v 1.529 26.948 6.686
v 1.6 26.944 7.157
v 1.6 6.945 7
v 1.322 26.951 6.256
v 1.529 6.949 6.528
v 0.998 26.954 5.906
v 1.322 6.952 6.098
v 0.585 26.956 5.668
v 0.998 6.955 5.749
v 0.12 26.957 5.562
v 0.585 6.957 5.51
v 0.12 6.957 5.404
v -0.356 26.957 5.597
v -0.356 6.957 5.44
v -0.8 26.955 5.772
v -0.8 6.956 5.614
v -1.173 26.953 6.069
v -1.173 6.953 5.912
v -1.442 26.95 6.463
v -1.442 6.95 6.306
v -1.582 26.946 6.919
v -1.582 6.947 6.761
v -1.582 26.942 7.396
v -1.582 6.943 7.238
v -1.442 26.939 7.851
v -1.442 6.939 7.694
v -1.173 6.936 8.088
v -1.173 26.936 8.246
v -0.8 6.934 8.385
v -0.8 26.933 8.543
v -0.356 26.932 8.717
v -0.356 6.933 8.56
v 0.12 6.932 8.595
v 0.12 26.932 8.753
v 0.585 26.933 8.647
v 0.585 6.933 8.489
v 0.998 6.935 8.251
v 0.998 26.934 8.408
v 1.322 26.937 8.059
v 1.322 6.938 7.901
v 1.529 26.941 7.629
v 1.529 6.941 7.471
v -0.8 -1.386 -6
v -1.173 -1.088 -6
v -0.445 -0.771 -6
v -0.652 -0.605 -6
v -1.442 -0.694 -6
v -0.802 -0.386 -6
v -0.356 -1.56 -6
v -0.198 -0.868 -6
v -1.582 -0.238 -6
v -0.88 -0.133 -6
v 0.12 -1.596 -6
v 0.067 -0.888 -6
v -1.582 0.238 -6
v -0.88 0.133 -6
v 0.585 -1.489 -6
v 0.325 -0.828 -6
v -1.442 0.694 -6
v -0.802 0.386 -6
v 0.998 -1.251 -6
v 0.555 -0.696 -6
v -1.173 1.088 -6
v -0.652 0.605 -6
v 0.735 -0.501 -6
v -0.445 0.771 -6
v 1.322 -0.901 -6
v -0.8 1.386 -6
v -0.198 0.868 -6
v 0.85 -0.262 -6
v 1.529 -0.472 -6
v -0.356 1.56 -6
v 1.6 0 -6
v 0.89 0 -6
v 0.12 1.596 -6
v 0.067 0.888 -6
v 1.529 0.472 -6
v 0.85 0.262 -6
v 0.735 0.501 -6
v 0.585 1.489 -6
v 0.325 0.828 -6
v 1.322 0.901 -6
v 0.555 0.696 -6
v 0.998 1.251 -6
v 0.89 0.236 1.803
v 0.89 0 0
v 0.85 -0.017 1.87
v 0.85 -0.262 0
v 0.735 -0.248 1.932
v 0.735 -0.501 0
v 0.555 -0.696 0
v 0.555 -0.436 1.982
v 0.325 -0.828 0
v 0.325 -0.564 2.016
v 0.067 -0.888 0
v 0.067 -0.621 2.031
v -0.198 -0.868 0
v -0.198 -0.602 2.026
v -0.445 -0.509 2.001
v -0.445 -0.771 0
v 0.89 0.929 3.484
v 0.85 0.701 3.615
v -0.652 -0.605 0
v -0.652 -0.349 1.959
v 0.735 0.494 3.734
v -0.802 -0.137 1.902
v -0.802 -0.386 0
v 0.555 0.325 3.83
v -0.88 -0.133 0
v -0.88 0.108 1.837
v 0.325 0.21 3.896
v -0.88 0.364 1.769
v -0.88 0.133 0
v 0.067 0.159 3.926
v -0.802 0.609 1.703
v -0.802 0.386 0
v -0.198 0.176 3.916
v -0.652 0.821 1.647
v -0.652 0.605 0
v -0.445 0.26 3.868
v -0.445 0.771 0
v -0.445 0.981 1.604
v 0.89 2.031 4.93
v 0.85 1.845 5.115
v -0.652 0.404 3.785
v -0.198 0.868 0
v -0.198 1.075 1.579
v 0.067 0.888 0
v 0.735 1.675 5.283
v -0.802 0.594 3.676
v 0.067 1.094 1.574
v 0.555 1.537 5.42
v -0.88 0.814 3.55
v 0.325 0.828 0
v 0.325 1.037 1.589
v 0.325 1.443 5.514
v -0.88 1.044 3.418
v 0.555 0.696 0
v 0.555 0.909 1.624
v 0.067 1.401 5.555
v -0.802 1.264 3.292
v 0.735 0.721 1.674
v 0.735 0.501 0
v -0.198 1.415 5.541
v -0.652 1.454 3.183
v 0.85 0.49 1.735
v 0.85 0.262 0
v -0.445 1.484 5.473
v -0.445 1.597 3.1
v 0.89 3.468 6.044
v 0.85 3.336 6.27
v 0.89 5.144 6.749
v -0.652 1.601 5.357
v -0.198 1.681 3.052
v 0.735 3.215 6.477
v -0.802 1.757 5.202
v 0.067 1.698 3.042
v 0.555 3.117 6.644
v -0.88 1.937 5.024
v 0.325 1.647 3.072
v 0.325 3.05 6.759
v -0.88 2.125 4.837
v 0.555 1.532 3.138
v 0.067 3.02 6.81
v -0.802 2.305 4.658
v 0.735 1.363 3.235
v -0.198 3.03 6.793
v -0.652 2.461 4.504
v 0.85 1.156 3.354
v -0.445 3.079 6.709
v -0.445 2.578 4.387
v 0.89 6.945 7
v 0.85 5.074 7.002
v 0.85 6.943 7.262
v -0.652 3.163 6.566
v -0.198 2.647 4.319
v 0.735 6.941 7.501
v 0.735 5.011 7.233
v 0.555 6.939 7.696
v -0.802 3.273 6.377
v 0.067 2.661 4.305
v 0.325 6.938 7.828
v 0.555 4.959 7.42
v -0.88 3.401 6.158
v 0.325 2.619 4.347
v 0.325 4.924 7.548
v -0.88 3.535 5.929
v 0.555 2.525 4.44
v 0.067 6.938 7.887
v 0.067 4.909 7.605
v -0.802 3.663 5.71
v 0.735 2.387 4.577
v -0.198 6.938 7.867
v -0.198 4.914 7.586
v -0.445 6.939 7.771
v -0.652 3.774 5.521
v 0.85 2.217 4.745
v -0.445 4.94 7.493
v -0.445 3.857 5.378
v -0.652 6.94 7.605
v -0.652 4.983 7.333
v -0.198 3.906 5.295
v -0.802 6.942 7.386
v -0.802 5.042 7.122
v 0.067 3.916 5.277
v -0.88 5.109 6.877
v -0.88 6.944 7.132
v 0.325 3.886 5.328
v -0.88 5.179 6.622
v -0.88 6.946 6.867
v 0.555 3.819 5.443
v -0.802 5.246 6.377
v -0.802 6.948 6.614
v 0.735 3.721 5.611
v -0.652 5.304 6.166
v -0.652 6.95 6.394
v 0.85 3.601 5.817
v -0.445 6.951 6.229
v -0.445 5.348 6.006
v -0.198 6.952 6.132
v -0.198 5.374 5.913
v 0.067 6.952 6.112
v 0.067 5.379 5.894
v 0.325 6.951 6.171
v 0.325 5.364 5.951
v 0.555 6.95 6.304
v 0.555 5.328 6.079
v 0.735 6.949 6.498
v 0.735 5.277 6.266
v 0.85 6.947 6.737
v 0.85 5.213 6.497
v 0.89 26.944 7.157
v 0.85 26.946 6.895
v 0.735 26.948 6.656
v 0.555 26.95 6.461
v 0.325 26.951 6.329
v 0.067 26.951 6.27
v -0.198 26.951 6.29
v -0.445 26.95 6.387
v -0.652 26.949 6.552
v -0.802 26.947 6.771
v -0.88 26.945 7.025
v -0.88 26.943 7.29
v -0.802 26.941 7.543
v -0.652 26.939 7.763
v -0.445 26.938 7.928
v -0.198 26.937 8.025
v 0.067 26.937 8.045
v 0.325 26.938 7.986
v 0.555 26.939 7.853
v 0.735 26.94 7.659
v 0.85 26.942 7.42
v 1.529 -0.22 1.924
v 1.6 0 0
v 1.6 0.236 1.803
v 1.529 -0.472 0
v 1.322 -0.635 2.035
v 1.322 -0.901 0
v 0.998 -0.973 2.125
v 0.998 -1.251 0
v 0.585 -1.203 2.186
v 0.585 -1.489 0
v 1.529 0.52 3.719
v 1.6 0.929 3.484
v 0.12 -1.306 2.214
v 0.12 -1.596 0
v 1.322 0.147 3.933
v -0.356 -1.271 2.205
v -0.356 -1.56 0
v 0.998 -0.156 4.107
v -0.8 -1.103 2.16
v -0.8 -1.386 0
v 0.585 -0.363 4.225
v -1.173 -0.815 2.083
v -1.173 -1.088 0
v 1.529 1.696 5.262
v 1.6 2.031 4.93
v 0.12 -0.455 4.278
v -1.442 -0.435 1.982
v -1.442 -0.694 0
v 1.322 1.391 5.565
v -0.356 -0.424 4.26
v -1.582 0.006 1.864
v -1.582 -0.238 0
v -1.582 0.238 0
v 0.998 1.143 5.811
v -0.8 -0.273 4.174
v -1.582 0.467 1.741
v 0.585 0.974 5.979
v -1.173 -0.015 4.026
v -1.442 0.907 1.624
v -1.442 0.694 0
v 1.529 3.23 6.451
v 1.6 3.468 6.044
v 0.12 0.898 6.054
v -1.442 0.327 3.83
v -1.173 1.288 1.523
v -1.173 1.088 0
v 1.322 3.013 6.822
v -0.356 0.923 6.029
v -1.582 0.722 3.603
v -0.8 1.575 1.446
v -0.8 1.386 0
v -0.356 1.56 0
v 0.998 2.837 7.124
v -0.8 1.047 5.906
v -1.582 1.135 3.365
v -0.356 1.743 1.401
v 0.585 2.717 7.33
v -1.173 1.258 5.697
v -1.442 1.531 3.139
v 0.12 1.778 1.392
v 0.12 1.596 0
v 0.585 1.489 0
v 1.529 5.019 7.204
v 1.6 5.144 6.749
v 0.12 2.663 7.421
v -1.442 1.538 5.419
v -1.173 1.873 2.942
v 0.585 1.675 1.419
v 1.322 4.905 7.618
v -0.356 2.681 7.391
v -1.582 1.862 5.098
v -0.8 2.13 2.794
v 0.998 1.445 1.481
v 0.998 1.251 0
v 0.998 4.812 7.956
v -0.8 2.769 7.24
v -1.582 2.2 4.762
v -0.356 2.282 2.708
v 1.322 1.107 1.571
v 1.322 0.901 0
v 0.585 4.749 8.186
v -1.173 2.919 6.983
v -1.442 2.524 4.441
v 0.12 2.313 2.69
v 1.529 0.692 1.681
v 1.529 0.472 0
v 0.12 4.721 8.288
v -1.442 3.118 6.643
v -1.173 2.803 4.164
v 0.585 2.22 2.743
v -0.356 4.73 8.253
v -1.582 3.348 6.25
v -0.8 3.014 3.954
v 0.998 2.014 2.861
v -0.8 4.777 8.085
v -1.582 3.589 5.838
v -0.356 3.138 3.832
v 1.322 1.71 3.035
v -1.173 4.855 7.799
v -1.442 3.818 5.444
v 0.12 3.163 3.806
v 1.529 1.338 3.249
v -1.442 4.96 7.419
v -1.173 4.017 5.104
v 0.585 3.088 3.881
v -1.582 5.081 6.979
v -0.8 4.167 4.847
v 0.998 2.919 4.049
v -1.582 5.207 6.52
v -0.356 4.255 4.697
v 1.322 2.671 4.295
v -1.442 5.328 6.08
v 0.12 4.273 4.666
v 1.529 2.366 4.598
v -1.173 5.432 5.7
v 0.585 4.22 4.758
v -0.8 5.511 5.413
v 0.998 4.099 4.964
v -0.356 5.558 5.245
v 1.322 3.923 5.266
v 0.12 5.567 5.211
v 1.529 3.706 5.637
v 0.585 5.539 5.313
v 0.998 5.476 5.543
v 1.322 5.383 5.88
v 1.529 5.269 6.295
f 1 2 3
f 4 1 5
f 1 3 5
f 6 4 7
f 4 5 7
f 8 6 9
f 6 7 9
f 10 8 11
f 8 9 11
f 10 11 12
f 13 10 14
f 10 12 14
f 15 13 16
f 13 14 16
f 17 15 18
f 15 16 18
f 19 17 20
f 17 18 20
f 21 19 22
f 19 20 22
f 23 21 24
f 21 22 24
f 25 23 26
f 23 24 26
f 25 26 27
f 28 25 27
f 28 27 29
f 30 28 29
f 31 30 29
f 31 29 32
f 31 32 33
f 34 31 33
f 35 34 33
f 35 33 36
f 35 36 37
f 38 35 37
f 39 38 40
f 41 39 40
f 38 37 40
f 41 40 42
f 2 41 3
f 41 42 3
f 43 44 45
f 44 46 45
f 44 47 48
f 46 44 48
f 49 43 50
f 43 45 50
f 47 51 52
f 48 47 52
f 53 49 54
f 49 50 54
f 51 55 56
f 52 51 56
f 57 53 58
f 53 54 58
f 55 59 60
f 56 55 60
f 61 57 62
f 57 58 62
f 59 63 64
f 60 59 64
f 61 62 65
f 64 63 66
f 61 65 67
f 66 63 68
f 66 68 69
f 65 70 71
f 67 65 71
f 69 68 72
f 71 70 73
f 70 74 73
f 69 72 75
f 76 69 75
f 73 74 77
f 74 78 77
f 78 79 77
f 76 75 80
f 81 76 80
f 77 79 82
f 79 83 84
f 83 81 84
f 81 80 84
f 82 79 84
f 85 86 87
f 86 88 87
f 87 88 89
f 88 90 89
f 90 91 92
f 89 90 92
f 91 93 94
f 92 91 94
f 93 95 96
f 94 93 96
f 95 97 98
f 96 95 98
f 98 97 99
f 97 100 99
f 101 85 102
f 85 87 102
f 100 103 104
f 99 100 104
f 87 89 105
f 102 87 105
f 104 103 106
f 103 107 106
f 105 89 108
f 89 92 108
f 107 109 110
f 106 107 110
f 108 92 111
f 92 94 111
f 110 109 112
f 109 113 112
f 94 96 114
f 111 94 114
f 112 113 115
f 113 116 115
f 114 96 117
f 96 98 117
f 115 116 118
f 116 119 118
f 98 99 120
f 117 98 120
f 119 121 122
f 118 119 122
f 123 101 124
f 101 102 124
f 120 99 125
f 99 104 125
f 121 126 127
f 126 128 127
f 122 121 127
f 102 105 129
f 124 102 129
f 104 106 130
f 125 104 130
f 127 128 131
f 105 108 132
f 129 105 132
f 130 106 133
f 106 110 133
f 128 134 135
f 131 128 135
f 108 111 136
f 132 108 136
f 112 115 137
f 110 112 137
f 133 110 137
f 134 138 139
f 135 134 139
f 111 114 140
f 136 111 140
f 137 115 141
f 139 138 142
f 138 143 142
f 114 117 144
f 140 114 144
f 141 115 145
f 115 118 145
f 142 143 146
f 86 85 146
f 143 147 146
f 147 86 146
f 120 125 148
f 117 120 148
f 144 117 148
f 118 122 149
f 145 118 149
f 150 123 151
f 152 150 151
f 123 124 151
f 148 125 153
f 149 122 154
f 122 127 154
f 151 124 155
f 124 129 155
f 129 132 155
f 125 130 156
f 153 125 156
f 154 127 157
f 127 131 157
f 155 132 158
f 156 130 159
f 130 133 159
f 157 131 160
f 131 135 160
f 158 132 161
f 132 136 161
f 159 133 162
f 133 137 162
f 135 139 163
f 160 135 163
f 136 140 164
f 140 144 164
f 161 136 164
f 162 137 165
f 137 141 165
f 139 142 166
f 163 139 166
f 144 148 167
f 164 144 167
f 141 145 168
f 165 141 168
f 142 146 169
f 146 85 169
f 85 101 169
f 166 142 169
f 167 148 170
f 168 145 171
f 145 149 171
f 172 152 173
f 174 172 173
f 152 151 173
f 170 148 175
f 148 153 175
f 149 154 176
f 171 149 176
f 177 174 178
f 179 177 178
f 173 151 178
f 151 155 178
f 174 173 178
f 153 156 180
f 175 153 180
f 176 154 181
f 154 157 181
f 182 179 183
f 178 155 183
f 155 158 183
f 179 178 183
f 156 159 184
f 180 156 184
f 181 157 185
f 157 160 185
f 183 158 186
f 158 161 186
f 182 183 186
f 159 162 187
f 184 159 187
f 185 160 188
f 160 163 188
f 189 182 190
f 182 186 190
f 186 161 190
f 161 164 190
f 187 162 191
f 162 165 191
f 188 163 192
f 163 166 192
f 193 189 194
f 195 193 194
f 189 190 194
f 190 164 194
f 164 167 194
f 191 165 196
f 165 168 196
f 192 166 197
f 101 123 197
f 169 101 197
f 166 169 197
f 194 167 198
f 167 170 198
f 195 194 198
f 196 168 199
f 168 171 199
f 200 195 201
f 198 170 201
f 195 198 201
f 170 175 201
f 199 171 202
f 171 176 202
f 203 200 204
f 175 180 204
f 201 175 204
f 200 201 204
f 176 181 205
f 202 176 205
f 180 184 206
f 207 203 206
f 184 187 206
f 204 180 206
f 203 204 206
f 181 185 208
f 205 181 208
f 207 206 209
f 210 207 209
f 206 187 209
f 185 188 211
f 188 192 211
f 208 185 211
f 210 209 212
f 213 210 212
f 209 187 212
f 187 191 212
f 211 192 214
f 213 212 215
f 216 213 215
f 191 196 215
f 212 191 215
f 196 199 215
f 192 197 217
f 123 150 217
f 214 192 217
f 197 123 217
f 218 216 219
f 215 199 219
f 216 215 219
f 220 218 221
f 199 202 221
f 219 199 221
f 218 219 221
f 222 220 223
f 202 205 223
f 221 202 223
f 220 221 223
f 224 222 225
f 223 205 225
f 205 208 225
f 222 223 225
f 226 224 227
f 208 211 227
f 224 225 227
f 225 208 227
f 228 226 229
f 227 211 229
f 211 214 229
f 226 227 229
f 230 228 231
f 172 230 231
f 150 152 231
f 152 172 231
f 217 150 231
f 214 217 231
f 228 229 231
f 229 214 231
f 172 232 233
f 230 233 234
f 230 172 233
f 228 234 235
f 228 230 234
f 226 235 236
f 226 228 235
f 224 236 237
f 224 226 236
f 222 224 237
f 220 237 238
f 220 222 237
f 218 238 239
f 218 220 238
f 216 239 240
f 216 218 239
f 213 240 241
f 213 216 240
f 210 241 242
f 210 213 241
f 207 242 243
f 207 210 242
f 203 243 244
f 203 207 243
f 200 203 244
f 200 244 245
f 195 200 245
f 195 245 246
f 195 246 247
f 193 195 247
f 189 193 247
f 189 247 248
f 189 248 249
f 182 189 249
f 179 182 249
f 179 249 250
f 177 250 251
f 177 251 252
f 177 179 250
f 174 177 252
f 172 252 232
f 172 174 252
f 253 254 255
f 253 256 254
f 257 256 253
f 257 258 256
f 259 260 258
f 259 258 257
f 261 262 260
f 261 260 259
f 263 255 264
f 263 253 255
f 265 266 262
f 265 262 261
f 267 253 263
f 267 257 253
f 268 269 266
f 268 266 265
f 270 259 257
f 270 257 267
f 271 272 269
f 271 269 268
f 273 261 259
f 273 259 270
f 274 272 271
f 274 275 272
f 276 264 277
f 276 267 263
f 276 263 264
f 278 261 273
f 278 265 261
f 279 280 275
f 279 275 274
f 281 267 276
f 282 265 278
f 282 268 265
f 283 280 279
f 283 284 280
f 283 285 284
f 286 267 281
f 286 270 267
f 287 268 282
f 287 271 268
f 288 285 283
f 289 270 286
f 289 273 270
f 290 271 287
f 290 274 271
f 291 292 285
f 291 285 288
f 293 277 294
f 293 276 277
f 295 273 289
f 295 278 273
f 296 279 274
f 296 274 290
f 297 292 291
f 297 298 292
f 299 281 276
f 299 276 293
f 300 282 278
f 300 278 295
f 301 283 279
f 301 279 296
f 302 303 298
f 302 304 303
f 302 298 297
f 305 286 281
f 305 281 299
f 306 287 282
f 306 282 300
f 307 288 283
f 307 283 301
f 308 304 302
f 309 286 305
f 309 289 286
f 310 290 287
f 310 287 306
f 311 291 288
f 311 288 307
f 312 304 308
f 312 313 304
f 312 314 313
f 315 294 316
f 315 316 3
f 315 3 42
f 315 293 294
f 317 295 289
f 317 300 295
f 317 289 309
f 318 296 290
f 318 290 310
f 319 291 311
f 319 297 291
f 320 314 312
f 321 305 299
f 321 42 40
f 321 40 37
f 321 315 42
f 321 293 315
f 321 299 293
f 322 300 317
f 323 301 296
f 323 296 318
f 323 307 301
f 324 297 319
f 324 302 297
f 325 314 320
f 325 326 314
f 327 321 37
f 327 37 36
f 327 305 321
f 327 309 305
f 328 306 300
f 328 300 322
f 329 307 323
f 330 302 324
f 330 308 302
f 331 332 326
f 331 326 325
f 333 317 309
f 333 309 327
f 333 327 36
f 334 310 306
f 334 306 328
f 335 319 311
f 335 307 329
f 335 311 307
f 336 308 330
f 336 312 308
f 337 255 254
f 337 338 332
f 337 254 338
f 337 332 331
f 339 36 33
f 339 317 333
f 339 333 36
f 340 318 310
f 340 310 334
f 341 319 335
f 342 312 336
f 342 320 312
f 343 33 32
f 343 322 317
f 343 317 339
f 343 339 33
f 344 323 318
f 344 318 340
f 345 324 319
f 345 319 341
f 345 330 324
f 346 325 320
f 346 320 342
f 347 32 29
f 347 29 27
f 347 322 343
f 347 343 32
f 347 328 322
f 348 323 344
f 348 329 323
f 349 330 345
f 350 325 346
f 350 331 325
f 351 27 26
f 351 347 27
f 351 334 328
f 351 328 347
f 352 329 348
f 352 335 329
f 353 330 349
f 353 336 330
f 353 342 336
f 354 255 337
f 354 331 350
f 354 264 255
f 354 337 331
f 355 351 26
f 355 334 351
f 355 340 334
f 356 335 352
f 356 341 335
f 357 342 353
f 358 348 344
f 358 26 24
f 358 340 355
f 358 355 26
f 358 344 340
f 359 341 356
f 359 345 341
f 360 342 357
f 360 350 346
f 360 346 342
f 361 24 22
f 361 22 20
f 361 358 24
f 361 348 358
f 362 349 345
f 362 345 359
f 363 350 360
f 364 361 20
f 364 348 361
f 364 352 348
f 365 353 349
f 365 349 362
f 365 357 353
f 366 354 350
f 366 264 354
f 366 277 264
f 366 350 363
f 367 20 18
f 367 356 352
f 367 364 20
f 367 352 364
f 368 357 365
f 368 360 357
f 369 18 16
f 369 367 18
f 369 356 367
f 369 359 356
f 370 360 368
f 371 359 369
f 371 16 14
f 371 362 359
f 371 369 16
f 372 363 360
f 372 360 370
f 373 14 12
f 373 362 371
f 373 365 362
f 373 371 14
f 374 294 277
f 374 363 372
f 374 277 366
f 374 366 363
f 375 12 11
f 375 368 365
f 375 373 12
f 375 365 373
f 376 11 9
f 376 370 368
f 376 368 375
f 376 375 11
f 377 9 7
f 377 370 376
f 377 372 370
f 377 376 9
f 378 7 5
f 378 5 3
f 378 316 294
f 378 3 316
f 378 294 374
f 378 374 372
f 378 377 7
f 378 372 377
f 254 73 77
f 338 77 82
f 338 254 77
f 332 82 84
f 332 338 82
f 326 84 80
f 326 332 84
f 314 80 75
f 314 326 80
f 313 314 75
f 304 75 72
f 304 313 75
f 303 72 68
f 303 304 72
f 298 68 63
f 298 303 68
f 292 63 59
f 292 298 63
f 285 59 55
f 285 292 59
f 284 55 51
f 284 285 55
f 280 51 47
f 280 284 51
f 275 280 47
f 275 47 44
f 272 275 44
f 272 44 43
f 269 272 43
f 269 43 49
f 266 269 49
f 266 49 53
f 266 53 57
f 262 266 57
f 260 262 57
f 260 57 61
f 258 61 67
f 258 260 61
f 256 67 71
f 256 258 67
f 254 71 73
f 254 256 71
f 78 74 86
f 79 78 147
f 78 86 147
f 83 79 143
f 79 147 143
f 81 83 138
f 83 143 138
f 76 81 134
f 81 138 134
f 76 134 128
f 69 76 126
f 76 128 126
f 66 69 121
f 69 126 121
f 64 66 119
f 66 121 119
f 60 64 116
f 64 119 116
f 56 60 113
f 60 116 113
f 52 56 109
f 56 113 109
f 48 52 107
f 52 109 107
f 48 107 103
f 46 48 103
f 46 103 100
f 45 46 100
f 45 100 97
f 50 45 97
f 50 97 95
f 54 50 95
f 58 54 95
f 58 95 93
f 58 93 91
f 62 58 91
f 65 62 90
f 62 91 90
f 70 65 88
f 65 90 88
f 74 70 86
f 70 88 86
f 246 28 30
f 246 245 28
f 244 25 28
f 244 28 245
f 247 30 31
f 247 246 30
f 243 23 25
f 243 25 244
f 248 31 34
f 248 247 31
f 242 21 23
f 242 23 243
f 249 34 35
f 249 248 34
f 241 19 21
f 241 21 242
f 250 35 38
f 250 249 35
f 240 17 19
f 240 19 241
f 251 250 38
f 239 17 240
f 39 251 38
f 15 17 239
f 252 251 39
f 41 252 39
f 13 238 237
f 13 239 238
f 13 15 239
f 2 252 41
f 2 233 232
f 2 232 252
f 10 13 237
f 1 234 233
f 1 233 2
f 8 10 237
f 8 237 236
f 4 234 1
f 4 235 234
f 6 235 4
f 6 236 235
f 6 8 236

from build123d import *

# Parameters (mm, degrees)
SKETCH1_R           = 1.6
SKETCH1_R_2         = 0.89
SKETCH1_2_R         = 1.6
SKETCH1_2_R_2       = 0.89
BOSS_EXTRUDE1_DEPTH = 6
SKETCH5_R           = 1.6
SKETCH5_R_2         = 0.89
BOSS_EXTRUDE2_DEPTH = 20


with BuildPart() as part:
    # Sweep1: sweep along a path in Sketch2
    with BuildLine(Plane(origin=(0, 0, 0), x_dir=(0, 0, -1), z_dir=(1, 0, 0))) as sweep1_path:
        ThreePointArc((0, 0), (-4.930222368, 2.030804149), (-6.99978301, 6.944883598))
    # Sketch1 → Sweep1 (sweep)
    with BuildSketch(Plane.XY):
        Circle(SKETCH1_R)
        Circle(SKETCH1_R_2, mode=Mode.SUBTRACT)
    sweep(path=sweep1_path.line)

    # Sketch1<2> → Boss-Extrude1 (add)
    with BuildSketch(Plane.XY):
        Circle(SKETCH1_2_R)
        Circle(SKETCH1_2_R_2, mode=Mode.SUBTRACT)
    extrude(amount=-BOSS_EXTRUDE1_DEPTH)

    # Sketch5 → Boss-Extrude2 (add)
    with BuildSketch(Plane(origin=(0, 6.999566026, 0.055114693), x_dir=(1, 0, 0), z_dir=(0, 0.9999690013794313, 0.007873771664404696))):
        with Locations((0, -6.944883598)):
            Circle(SKETCH5_R)
        with Locations((0, -6.944883598)):
            Circle(SKETCH5_R_2, mode=Mode.SUBTRACT)
    extrude(amount=BOSS_EXTRUDE2_DEPTH)


solid = part.part
